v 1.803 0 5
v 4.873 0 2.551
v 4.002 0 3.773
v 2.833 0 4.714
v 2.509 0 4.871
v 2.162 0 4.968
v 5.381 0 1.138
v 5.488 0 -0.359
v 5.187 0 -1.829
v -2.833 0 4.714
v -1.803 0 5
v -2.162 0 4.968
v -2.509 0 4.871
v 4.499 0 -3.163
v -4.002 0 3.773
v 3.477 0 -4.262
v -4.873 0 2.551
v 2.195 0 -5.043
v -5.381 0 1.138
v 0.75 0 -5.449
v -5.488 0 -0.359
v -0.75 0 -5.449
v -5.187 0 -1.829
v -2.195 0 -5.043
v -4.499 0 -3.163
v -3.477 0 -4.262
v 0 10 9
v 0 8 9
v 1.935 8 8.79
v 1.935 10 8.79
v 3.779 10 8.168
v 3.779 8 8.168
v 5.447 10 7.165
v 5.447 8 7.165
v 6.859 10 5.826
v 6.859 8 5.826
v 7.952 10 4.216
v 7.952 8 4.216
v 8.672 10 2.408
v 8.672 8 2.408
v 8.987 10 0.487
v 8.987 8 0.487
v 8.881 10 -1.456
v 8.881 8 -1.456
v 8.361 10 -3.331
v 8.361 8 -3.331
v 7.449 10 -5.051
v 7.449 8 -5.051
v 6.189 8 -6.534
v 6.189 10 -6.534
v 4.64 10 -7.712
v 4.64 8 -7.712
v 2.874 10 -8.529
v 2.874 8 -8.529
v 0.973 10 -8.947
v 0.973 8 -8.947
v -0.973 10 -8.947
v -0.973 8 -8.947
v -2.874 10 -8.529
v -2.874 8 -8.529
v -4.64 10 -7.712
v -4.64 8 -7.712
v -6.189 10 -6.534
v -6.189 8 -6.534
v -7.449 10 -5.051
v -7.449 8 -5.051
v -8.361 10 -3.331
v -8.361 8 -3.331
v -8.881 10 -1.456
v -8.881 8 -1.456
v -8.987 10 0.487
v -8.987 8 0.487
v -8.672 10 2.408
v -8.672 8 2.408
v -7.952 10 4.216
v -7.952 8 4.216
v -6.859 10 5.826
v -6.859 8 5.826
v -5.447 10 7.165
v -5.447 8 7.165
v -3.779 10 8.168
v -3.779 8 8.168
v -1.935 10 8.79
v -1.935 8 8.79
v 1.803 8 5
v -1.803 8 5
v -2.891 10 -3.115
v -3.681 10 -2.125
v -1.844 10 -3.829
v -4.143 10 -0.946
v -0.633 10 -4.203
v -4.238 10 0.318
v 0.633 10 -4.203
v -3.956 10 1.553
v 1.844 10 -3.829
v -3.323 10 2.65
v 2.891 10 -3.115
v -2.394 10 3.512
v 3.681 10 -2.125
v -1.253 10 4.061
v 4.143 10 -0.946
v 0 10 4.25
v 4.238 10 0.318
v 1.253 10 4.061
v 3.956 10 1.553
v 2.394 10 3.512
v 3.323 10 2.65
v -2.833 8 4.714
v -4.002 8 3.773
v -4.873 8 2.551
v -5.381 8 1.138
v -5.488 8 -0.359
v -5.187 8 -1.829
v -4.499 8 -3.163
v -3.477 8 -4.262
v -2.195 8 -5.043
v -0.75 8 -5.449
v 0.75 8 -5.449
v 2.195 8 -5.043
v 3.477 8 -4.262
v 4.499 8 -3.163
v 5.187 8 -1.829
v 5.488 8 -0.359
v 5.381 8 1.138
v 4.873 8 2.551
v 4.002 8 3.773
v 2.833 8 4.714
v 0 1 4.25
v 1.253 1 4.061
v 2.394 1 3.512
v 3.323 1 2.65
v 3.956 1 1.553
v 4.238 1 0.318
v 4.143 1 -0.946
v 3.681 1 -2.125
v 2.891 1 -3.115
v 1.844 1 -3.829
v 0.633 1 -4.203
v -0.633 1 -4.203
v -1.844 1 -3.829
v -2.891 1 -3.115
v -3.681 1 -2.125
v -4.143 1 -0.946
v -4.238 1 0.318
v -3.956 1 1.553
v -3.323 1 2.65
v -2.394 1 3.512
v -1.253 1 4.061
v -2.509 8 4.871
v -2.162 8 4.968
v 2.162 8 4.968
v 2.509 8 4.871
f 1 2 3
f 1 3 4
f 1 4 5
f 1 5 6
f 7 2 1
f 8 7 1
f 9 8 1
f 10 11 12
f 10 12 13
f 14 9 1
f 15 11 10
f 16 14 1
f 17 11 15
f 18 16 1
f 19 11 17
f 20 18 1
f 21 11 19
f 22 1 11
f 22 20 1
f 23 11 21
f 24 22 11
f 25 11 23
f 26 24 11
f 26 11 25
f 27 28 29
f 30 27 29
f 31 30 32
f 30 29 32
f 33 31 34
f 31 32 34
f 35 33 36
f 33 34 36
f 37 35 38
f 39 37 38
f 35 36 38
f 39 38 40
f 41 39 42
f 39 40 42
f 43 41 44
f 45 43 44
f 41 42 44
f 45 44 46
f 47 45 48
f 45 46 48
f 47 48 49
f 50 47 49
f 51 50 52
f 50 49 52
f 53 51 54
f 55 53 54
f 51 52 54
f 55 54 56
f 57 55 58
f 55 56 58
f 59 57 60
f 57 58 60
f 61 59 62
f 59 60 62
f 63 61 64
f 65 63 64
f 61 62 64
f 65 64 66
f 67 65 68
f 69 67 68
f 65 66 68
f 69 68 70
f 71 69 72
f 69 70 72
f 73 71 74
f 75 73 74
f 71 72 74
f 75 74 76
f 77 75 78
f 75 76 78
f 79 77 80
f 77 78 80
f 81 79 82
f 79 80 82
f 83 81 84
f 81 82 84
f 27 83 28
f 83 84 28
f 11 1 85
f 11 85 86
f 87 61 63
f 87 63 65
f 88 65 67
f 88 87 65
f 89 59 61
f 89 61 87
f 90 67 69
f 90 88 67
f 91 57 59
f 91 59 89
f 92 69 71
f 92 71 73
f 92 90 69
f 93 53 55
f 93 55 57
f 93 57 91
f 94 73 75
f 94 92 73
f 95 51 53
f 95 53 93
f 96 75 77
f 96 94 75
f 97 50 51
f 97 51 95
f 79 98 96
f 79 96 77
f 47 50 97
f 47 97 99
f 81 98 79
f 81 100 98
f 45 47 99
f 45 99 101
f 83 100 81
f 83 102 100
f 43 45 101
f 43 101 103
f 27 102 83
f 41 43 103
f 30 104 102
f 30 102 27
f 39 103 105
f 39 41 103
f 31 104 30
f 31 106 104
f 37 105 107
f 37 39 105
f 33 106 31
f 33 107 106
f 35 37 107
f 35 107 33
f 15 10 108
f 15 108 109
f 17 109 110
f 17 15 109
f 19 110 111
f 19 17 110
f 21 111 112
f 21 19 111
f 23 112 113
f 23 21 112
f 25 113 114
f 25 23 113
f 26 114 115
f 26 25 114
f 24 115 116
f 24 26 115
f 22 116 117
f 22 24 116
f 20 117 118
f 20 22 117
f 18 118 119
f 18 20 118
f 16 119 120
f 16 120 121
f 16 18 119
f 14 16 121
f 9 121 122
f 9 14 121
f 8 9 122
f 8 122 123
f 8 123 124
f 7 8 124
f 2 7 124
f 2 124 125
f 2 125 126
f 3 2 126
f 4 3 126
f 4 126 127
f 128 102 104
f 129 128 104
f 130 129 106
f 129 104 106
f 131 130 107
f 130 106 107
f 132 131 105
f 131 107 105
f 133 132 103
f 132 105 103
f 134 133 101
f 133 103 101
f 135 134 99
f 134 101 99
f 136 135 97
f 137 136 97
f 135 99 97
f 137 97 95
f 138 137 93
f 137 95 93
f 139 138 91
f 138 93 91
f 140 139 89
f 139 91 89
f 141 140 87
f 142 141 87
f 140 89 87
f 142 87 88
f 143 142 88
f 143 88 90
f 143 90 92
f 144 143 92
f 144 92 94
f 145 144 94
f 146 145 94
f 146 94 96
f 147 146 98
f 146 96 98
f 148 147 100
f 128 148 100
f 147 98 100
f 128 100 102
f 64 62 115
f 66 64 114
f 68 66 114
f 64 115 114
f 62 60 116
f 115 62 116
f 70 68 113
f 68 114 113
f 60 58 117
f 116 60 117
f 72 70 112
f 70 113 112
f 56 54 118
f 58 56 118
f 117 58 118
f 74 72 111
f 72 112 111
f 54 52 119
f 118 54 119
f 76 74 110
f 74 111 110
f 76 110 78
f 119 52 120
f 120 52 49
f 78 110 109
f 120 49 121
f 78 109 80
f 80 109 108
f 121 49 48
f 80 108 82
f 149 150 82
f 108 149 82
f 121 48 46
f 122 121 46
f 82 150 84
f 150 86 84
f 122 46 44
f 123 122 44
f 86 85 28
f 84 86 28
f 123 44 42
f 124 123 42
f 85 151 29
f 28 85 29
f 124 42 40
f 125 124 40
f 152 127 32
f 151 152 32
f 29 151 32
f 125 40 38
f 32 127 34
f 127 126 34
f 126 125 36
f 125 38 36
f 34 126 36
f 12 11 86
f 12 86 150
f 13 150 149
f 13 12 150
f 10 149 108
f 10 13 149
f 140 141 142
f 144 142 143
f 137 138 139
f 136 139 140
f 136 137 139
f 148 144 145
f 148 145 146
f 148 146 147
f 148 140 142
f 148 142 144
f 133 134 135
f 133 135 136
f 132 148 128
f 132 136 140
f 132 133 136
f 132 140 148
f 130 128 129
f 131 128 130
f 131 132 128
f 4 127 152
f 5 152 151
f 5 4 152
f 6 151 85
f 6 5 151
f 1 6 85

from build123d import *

# Parameters (mm, degrees)
BOSS_EXTRUDE1_DEPTH = 10
SKETCH2_R           = 4.25
CUT_EXTRUDE1_DEPTH  = 9
BOSS_EXTRUDE2_START = -2
SKETCH3_R           = 9
BOSS_EXTRUDE2_DEPTH = 2


with BuildPart() as part:
    # Sketch1 → Boss-Extrude1 (new body)
    with BuildSketch(Plane(origin=(0, 0, 0), x_dir=(1, 0, 0), z_dir=(0, 1, 0))):
        with BuildLine():
            Line((1.802775638, -5), (-1.802775638, -5))
            ThreePointArc((-1.802775638, -5), (-2.337298122, -4.927248223), (-2.832933145, -4.714285714))
            ThreePointArc((-2.832933145, -4.714285714), (0, 5.5), (2.832933145, -4.714285714))
            ThreePointArc((2.832933145, -4.714285714), (2.337298122, -4.927248223), (1.802775638, -5))
        make_face()
    extrude(amount=BOSS_EXTRUDE1_DEPTH)

    # Sketch2 → Cut-Extrude1 (cut)
    with BuildSketch(Plane(origin=(0, 10, 0), x_dir=(1, 0, 0), z_dir=(0, 1, 0))):
        with Locations(Location((0, 0, 0), (0, 0, 270))):
            Circle(SKETCH2_R)
    extrude(amount=-CUT_EXTRUDE1_DEPTH, mode=Mode.SUBTRACT)

    # Sketch3 → Boss-Extrude2 (add)
    with BuildSketch(Plane(origin=(0, 10, 0), x_dir=(1, 0, 0), z_dir=(0, 1, 0)).offset(BOSS_EXTRUDE2_START)):
        with Locations(Location((0, 0, 0), (0, 0, 270))):
            Circle(SKETCH3_R)
        with BuildLine():
            Line((1.802775638, -5), (-1.802775638, -5))
            ThreePointArc((-1.802775638, -5), (-2.337298122, -4.927248223), (-2.832933145, -4.714285714))
            ThreePointArc((-2.832933145, -4.714285714), (0, 5.5), (2.832933145, -4.714285714))
            ThreePointArc((2.832933145, -4.714285714), (2.337298122, -4.927248223), (1.802775638, -5))
        make_face(mode=Mode.SUBTRACT)
    extrude(amount=BOSS_EXTRUDE2_DEPTH)


solid = part.part
